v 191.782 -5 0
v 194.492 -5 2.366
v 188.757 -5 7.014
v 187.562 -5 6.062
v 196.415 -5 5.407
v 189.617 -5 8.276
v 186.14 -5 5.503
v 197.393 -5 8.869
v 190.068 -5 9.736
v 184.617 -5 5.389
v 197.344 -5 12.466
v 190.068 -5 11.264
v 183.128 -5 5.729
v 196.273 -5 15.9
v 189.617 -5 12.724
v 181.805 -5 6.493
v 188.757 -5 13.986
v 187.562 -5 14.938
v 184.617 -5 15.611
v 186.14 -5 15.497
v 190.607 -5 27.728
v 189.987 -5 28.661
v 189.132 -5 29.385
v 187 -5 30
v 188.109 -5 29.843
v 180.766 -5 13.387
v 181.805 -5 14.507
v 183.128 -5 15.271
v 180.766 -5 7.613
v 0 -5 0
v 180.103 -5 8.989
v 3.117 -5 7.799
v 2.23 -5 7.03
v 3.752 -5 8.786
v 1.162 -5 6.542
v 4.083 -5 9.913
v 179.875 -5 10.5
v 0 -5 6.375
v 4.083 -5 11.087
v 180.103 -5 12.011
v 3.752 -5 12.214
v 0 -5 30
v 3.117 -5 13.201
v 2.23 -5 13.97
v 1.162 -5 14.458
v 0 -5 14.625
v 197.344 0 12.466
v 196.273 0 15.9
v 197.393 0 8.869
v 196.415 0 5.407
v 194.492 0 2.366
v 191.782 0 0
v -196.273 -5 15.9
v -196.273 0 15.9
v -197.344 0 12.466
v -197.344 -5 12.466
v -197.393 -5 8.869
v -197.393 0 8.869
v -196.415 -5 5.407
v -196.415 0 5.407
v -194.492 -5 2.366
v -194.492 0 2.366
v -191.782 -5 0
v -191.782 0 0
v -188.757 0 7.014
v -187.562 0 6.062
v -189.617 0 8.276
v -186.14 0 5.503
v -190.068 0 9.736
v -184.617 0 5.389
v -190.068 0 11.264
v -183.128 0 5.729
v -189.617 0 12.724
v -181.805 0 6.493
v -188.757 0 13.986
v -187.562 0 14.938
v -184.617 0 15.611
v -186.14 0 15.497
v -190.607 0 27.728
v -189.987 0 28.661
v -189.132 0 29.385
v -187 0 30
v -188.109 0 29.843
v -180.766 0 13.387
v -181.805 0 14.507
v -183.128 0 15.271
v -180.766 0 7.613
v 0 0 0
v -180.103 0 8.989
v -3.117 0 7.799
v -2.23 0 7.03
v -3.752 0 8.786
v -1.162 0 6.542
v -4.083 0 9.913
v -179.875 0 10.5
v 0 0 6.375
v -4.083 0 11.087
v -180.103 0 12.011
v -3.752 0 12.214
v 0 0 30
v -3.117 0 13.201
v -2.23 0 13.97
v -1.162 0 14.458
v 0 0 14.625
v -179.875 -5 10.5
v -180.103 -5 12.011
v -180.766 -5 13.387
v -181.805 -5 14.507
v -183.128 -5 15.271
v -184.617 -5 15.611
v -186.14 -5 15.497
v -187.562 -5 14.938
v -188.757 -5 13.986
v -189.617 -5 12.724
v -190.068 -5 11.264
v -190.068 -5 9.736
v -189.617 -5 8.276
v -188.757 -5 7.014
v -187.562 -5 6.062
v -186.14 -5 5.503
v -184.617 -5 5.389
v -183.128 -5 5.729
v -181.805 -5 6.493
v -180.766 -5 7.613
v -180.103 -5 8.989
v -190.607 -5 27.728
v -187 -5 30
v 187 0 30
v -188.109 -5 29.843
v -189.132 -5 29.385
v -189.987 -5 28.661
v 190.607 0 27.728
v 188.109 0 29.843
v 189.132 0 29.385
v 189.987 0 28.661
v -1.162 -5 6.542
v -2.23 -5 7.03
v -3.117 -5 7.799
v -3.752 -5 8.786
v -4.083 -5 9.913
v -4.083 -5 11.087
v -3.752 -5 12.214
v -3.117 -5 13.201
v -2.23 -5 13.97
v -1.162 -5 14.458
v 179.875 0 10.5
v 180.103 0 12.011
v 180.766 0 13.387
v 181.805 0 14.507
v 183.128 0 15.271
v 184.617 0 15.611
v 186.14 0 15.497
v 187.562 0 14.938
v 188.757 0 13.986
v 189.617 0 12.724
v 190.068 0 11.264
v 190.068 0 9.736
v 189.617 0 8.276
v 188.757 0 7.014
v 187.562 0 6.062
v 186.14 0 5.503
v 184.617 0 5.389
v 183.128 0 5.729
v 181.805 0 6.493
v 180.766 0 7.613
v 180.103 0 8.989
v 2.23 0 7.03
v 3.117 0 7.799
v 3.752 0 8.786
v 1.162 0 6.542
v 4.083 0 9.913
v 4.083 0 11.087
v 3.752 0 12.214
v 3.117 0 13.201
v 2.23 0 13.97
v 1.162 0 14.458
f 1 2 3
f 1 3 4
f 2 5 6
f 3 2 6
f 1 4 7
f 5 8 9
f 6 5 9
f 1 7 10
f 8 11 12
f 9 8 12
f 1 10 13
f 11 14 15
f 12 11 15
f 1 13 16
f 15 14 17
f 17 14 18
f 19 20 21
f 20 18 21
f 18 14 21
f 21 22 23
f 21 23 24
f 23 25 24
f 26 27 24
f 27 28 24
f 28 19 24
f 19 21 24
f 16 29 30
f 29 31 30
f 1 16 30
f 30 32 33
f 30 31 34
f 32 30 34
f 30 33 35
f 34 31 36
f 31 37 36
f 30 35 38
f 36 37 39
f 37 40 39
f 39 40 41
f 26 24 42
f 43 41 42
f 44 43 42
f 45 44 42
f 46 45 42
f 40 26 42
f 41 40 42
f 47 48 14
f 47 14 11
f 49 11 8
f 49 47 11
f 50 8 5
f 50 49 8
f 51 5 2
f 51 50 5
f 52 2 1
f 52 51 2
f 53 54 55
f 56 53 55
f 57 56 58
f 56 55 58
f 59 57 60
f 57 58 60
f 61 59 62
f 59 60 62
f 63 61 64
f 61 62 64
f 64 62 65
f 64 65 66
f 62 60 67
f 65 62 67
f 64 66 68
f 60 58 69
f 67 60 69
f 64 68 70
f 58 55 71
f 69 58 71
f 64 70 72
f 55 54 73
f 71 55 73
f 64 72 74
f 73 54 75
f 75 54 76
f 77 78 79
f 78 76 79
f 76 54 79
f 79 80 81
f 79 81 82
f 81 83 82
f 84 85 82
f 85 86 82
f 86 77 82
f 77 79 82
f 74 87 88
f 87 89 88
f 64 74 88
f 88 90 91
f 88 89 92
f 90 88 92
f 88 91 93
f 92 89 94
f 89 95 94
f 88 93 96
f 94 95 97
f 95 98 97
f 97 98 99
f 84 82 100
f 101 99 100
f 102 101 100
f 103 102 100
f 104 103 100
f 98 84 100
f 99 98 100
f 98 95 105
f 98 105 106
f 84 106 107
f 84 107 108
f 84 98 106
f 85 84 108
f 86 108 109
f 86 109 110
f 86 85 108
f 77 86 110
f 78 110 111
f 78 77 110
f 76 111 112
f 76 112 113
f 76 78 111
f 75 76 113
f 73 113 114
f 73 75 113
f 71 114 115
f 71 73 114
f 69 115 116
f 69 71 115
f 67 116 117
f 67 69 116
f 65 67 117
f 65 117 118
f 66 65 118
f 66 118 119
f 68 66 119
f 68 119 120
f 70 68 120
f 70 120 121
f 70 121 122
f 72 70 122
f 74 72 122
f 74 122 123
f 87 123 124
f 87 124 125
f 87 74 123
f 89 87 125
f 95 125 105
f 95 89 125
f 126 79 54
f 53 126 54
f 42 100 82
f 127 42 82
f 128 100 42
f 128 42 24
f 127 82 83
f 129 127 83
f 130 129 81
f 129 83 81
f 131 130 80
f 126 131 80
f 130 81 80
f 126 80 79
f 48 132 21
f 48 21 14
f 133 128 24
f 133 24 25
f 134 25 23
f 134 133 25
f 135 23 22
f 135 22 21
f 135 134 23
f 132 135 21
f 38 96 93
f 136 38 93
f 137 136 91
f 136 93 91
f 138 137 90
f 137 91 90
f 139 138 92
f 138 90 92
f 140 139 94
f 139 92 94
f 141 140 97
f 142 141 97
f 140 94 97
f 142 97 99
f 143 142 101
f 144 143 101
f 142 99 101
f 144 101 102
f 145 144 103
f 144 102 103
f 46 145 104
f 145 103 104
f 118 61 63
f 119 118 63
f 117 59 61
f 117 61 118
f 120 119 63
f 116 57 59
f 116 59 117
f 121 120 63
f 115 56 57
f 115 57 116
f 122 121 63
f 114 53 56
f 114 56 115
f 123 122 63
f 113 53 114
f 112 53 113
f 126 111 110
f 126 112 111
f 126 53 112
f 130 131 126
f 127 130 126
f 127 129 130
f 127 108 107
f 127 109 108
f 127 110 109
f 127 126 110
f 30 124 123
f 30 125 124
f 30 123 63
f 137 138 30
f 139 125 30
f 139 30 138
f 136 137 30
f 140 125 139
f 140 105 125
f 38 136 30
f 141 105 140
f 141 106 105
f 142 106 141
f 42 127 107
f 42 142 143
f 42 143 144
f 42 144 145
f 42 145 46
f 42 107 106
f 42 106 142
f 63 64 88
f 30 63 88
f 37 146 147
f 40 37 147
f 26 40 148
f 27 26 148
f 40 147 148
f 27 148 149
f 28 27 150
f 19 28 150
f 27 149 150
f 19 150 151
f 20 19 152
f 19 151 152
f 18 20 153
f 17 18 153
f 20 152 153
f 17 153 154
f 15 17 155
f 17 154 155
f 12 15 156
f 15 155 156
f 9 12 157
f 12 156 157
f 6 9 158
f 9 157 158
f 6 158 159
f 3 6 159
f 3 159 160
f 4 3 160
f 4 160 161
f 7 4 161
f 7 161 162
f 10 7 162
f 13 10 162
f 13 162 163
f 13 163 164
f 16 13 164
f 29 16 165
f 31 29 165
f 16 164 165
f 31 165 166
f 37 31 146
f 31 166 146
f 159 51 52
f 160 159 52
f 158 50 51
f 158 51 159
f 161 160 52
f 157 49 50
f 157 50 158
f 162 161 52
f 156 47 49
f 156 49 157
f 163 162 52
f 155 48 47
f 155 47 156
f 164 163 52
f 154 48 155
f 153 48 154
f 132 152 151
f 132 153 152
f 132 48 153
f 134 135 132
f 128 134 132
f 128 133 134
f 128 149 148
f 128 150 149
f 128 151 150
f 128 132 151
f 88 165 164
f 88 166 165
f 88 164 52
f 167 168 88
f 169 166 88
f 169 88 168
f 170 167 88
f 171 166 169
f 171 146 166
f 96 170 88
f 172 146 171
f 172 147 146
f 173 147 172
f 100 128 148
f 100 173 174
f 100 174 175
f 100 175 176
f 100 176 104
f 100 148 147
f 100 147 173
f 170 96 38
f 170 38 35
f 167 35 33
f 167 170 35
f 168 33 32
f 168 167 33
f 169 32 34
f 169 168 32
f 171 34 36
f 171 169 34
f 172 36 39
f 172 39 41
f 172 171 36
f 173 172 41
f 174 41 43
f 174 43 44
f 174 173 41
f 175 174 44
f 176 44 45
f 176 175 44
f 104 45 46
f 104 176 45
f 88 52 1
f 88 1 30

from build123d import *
from build123d import SkipClean  # not in build123d's __all__

# Parameters (mm, degrees)
F0_R     = 5.125
F1_DEPTH = 5


with BuildPart() as f1:
    # F0 (on Front) → F1 (new body)
    with BuildSketch(Plane.XZ):
        with BuildLine():
            Line((-191.7823299831, 0), (0, 0))
            Line((0, 0), (0, 6.375))
            ThreePointArc((0, 6.375), (-4.125, 10.5), (0, 14.625))
            Line((0, 14.625), (0, 30))
            Line((0, 30), (-187, 30))
            ThreePointArc((-187, 30), (-189.1316333954, 29.3846918719), (-190.6074611137, 27.7280695337))
            Line((-190.6074611137, 27.7280695337), (-196.2733159802, 15.9002172929))
            ThreePointArc((-196.2733159802, 15.9002172929), (-197.029373021, 7.1023265723), (-191.7823299831, 0))
        make_face()
        with Locations((-185, 10.5)):
            Circle(F0_R, mode=Mode.SUBTRACT)
    extrude(amount=F1_DEPTH)

    # F2: F1 across plane


with BuildPart() as f1_1:
    add(f1.part, clean=False)
    with SkipClean():  # cleaning this boolean's faces spoils the solid; the shape is the same uncleaned
        add(f1.part.mirror(Plane.YZ), clean=False)


solid = f1_1.part
